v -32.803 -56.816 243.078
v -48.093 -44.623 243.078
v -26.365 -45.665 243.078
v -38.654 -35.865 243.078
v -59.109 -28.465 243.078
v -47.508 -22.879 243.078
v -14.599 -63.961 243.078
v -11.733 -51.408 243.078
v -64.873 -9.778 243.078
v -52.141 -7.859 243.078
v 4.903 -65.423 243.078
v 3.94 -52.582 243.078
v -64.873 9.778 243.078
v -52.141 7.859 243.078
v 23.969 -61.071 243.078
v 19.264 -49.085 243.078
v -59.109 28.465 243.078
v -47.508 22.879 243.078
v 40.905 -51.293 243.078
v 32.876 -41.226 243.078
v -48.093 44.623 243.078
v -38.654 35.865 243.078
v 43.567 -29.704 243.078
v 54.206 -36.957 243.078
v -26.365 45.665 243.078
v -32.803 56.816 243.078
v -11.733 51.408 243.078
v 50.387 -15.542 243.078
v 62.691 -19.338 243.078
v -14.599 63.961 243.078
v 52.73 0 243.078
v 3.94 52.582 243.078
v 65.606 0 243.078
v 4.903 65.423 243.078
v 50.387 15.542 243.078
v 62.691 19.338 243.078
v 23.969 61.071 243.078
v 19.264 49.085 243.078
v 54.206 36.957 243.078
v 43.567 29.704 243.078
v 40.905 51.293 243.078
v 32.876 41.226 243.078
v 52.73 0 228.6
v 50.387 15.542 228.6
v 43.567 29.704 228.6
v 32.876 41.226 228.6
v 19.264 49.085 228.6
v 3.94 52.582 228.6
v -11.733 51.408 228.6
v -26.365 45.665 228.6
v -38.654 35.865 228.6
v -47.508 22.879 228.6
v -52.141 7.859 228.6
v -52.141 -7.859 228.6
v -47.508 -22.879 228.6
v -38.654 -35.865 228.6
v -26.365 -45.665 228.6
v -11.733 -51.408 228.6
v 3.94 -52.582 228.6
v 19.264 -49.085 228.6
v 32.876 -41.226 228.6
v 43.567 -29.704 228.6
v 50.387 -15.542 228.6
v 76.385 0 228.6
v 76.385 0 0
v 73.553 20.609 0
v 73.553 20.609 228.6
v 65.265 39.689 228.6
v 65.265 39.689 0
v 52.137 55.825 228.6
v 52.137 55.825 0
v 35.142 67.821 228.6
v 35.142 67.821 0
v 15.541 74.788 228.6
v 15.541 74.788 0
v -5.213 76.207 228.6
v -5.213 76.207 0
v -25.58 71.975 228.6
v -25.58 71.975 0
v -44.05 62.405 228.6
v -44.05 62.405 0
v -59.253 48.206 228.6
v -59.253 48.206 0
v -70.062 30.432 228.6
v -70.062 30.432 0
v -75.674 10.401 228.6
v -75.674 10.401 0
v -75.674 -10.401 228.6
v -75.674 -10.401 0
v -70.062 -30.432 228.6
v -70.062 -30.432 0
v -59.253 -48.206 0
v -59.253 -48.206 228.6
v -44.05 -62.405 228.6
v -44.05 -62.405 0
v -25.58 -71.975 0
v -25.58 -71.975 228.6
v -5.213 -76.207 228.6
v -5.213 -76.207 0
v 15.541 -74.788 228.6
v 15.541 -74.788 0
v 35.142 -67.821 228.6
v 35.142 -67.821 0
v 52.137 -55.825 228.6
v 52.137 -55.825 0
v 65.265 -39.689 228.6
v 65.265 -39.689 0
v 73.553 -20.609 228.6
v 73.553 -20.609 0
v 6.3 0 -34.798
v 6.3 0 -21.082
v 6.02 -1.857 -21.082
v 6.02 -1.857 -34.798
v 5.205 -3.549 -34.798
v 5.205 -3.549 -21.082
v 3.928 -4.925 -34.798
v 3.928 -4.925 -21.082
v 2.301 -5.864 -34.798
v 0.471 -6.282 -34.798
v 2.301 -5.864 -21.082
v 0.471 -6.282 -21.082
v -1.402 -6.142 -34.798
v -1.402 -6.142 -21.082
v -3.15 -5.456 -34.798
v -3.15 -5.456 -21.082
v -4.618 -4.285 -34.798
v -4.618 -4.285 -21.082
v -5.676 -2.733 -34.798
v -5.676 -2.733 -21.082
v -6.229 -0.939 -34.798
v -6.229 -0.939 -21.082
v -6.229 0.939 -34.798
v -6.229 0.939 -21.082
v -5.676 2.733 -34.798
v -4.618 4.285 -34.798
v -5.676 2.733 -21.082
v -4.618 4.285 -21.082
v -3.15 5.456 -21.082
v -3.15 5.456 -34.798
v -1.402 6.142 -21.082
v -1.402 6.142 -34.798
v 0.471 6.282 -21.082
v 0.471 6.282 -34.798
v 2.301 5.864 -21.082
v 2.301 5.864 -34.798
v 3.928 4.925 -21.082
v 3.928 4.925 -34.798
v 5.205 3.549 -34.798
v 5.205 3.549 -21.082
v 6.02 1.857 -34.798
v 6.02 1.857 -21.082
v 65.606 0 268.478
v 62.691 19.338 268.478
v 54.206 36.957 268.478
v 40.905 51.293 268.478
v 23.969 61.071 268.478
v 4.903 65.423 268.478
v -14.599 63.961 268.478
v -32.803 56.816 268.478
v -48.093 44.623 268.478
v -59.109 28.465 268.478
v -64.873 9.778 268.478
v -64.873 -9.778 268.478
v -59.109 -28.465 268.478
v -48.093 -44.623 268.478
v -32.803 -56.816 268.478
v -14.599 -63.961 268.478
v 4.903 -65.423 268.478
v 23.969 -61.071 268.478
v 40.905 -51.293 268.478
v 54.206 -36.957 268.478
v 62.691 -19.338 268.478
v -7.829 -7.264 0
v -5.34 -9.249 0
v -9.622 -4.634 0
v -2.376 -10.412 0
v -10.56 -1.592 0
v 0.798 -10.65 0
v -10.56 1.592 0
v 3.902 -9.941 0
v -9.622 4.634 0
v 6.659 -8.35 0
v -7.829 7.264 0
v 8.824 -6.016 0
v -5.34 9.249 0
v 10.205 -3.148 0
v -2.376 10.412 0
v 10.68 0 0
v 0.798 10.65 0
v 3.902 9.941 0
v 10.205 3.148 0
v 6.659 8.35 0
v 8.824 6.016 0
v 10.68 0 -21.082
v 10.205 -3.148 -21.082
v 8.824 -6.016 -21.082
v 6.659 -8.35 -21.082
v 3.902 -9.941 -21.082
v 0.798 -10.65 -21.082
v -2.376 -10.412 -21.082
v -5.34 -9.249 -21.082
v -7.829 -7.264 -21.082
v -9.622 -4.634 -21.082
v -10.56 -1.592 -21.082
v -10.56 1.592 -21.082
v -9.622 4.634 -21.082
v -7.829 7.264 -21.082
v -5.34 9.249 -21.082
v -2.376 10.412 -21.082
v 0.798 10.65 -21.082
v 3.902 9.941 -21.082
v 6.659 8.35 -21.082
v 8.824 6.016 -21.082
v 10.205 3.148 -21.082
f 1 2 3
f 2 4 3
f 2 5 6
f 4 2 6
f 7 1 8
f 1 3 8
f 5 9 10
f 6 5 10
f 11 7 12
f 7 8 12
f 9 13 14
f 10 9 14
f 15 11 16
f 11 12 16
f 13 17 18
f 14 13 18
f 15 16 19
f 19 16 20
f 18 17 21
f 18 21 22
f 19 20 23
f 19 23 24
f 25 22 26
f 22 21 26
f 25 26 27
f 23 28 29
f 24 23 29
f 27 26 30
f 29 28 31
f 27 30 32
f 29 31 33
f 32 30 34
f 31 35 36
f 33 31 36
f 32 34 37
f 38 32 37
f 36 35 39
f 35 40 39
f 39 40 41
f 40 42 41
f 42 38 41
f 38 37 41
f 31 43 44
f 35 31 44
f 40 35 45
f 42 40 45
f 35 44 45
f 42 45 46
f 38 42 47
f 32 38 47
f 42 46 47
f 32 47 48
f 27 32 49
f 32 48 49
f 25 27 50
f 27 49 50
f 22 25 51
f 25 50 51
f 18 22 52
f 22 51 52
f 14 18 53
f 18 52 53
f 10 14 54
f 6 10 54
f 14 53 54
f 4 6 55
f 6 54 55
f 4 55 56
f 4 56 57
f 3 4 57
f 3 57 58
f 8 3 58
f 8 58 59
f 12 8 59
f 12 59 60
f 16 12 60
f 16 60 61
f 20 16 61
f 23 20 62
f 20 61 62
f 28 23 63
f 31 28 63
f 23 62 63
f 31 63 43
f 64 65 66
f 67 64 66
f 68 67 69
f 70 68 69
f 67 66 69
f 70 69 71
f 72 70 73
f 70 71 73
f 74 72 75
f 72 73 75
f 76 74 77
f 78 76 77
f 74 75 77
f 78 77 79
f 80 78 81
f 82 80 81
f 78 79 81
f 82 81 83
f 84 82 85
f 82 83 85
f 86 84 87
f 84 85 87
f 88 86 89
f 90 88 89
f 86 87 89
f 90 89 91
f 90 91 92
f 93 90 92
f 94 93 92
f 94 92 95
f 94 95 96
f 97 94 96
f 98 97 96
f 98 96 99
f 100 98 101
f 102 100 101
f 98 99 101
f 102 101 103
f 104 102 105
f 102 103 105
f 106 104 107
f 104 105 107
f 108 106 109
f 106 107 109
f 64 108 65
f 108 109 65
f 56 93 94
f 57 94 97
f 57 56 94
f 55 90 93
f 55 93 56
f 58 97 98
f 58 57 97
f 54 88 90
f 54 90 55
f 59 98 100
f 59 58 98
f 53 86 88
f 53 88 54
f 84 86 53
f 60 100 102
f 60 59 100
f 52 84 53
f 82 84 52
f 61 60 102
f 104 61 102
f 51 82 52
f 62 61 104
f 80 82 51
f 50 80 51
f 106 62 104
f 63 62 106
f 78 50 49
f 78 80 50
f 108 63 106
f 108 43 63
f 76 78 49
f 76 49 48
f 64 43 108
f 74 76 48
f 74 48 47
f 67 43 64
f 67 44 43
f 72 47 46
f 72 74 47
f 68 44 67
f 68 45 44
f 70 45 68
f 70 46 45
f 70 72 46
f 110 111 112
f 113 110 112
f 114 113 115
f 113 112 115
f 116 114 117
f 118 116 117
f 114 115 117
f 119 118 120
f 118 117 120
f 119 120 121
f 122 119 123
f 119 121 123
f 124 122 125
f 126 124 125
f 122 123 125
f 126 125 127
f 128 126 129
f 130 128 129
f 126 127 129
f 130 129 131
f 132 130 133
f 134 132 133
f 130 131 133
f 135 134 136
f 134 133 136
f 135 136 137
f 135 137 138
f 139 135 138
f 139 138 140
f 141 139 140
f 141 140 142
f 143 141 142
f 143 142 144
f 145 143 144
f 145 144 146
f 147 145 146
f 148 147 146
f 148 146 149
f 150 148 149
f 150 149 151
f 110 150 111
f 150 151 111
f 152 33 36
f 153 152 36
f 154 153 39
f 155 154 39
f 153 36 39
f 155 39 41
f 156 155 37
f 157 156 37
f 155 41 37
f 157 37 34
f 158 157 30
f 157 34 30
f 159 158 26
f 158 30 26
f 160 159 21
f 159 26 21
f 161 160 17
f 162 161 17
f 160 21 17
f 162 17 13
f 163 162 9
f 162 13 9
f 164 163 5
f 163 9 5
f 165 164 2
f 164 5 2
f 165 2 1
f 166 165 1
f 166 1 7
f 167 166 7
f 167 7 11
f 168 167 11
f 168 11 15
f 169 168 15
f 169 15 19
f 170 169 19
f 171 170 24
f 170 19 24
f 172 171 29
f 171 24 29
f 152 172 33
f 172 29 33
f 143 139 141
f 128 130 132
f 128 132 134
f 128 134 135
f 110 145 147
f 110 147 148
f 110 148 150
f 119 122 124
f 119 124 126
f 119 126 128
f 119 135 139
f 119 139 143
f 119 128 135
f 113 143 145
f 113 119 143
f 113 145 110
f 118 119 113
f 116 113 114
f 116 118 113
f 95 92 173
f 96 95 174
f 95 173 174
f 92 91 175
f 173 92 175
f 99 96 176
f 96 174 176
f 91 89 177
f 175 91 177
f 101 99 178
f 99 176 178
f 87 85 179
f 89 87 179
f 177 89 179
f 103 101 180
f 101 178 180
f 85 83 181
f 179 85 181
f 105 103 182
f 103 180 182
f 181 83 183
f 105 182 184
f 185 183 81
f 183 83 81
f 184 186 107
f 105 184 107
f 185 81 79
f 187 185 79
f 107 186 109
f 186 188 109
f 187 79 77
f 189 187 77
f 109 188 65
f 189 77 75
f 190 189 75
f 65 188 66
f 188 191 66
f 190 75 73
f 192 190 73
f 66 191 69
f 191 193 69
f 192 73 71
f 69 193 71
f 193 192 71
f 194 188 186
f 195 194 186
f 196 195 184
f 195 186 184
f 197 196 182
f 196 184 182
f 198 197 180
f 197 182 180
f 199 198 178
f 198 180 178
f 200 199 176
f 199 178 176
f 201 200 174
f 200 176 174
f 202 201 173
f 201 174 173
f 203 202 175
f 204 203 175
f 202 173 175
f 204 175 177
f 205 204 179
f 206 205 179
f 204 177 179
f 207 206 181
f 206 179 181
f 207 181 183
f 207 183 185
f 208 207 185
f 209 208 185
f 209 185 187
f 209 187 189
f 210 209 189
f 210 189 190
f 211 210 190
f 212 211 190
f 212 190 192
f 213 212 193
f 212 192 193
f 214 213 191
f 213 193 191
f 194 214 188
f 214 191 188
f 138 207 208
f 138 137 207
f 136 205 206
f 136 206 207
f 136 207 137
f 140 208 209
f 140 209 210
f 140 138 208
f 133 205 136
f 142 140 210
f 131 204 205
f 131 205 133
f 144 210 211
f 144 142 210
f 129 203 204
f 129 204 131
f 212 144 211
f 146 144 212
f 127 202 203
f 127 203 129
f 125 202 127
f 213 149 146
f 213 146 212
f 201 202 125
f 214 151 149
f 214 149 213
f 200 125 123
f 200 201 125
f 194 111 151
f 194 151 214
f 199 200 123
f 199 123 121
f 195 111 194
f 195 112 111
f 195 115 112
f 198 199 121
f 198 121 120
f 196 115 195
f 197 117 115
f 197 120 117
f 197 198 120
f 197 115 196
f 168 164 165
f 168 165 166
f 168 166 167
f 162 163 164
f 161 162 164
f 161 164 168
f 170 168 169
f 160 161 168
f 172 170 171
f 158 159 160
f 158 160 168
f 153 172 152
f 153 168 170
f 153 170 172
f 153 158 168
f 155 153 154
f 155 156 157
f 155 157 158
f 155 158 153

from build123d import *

# Parameters (mm, degrees)
F0_R     = 76.385424
F1_DEPTH = 228.6
F2_R     = 52.72962
F3_DEPTH = 14.478
F4_R     = 65.606028
F5_DEPTH = 25.4
F6_R     = 10.679564
F7_DEPTH = 21.082
F8_R     = 6.299562
F9_DEPTH = 13.716


with BuildPart() as f1:
    # F0 (on Top) → F1 (new body)
    with BuildSketch(Plane.XY):
        Circle(F0_R)
    extrude(amount=F1_DEPTH)

    # F2 (on face) → F3 (join)
    with BuildSketch(Plane.XY.offset(228.6)):
        Circle(F2_R)
    extrude(amount=F3_DEPTH)

    # F4 (on face) → F5 (join)
    with BuildSketch(Plane.XY.offset(243.078)):
        Circle(F4_R)
    extrude(amount=F5_DEPTH)

    # F6 (on face) → F7 (join)
    with BuildSketch(Plane(origin=(0, 0, 0), x_dir=(1, 0, 0), z_dir=(0, 0, -1))):
        Circle(F6_R)
    extrude(amount=F7_DEPTH)

    # F8 (on face) → F9 (join)
    with BuildSketch(Plane(origin=(0, 0, -21.082), x_dir=(1, 0, 0), z_dir=(0, 0, -1))):
        Circle(F8_R)
    extrude(amount=F9_DEPTH)


solid = f1.part
